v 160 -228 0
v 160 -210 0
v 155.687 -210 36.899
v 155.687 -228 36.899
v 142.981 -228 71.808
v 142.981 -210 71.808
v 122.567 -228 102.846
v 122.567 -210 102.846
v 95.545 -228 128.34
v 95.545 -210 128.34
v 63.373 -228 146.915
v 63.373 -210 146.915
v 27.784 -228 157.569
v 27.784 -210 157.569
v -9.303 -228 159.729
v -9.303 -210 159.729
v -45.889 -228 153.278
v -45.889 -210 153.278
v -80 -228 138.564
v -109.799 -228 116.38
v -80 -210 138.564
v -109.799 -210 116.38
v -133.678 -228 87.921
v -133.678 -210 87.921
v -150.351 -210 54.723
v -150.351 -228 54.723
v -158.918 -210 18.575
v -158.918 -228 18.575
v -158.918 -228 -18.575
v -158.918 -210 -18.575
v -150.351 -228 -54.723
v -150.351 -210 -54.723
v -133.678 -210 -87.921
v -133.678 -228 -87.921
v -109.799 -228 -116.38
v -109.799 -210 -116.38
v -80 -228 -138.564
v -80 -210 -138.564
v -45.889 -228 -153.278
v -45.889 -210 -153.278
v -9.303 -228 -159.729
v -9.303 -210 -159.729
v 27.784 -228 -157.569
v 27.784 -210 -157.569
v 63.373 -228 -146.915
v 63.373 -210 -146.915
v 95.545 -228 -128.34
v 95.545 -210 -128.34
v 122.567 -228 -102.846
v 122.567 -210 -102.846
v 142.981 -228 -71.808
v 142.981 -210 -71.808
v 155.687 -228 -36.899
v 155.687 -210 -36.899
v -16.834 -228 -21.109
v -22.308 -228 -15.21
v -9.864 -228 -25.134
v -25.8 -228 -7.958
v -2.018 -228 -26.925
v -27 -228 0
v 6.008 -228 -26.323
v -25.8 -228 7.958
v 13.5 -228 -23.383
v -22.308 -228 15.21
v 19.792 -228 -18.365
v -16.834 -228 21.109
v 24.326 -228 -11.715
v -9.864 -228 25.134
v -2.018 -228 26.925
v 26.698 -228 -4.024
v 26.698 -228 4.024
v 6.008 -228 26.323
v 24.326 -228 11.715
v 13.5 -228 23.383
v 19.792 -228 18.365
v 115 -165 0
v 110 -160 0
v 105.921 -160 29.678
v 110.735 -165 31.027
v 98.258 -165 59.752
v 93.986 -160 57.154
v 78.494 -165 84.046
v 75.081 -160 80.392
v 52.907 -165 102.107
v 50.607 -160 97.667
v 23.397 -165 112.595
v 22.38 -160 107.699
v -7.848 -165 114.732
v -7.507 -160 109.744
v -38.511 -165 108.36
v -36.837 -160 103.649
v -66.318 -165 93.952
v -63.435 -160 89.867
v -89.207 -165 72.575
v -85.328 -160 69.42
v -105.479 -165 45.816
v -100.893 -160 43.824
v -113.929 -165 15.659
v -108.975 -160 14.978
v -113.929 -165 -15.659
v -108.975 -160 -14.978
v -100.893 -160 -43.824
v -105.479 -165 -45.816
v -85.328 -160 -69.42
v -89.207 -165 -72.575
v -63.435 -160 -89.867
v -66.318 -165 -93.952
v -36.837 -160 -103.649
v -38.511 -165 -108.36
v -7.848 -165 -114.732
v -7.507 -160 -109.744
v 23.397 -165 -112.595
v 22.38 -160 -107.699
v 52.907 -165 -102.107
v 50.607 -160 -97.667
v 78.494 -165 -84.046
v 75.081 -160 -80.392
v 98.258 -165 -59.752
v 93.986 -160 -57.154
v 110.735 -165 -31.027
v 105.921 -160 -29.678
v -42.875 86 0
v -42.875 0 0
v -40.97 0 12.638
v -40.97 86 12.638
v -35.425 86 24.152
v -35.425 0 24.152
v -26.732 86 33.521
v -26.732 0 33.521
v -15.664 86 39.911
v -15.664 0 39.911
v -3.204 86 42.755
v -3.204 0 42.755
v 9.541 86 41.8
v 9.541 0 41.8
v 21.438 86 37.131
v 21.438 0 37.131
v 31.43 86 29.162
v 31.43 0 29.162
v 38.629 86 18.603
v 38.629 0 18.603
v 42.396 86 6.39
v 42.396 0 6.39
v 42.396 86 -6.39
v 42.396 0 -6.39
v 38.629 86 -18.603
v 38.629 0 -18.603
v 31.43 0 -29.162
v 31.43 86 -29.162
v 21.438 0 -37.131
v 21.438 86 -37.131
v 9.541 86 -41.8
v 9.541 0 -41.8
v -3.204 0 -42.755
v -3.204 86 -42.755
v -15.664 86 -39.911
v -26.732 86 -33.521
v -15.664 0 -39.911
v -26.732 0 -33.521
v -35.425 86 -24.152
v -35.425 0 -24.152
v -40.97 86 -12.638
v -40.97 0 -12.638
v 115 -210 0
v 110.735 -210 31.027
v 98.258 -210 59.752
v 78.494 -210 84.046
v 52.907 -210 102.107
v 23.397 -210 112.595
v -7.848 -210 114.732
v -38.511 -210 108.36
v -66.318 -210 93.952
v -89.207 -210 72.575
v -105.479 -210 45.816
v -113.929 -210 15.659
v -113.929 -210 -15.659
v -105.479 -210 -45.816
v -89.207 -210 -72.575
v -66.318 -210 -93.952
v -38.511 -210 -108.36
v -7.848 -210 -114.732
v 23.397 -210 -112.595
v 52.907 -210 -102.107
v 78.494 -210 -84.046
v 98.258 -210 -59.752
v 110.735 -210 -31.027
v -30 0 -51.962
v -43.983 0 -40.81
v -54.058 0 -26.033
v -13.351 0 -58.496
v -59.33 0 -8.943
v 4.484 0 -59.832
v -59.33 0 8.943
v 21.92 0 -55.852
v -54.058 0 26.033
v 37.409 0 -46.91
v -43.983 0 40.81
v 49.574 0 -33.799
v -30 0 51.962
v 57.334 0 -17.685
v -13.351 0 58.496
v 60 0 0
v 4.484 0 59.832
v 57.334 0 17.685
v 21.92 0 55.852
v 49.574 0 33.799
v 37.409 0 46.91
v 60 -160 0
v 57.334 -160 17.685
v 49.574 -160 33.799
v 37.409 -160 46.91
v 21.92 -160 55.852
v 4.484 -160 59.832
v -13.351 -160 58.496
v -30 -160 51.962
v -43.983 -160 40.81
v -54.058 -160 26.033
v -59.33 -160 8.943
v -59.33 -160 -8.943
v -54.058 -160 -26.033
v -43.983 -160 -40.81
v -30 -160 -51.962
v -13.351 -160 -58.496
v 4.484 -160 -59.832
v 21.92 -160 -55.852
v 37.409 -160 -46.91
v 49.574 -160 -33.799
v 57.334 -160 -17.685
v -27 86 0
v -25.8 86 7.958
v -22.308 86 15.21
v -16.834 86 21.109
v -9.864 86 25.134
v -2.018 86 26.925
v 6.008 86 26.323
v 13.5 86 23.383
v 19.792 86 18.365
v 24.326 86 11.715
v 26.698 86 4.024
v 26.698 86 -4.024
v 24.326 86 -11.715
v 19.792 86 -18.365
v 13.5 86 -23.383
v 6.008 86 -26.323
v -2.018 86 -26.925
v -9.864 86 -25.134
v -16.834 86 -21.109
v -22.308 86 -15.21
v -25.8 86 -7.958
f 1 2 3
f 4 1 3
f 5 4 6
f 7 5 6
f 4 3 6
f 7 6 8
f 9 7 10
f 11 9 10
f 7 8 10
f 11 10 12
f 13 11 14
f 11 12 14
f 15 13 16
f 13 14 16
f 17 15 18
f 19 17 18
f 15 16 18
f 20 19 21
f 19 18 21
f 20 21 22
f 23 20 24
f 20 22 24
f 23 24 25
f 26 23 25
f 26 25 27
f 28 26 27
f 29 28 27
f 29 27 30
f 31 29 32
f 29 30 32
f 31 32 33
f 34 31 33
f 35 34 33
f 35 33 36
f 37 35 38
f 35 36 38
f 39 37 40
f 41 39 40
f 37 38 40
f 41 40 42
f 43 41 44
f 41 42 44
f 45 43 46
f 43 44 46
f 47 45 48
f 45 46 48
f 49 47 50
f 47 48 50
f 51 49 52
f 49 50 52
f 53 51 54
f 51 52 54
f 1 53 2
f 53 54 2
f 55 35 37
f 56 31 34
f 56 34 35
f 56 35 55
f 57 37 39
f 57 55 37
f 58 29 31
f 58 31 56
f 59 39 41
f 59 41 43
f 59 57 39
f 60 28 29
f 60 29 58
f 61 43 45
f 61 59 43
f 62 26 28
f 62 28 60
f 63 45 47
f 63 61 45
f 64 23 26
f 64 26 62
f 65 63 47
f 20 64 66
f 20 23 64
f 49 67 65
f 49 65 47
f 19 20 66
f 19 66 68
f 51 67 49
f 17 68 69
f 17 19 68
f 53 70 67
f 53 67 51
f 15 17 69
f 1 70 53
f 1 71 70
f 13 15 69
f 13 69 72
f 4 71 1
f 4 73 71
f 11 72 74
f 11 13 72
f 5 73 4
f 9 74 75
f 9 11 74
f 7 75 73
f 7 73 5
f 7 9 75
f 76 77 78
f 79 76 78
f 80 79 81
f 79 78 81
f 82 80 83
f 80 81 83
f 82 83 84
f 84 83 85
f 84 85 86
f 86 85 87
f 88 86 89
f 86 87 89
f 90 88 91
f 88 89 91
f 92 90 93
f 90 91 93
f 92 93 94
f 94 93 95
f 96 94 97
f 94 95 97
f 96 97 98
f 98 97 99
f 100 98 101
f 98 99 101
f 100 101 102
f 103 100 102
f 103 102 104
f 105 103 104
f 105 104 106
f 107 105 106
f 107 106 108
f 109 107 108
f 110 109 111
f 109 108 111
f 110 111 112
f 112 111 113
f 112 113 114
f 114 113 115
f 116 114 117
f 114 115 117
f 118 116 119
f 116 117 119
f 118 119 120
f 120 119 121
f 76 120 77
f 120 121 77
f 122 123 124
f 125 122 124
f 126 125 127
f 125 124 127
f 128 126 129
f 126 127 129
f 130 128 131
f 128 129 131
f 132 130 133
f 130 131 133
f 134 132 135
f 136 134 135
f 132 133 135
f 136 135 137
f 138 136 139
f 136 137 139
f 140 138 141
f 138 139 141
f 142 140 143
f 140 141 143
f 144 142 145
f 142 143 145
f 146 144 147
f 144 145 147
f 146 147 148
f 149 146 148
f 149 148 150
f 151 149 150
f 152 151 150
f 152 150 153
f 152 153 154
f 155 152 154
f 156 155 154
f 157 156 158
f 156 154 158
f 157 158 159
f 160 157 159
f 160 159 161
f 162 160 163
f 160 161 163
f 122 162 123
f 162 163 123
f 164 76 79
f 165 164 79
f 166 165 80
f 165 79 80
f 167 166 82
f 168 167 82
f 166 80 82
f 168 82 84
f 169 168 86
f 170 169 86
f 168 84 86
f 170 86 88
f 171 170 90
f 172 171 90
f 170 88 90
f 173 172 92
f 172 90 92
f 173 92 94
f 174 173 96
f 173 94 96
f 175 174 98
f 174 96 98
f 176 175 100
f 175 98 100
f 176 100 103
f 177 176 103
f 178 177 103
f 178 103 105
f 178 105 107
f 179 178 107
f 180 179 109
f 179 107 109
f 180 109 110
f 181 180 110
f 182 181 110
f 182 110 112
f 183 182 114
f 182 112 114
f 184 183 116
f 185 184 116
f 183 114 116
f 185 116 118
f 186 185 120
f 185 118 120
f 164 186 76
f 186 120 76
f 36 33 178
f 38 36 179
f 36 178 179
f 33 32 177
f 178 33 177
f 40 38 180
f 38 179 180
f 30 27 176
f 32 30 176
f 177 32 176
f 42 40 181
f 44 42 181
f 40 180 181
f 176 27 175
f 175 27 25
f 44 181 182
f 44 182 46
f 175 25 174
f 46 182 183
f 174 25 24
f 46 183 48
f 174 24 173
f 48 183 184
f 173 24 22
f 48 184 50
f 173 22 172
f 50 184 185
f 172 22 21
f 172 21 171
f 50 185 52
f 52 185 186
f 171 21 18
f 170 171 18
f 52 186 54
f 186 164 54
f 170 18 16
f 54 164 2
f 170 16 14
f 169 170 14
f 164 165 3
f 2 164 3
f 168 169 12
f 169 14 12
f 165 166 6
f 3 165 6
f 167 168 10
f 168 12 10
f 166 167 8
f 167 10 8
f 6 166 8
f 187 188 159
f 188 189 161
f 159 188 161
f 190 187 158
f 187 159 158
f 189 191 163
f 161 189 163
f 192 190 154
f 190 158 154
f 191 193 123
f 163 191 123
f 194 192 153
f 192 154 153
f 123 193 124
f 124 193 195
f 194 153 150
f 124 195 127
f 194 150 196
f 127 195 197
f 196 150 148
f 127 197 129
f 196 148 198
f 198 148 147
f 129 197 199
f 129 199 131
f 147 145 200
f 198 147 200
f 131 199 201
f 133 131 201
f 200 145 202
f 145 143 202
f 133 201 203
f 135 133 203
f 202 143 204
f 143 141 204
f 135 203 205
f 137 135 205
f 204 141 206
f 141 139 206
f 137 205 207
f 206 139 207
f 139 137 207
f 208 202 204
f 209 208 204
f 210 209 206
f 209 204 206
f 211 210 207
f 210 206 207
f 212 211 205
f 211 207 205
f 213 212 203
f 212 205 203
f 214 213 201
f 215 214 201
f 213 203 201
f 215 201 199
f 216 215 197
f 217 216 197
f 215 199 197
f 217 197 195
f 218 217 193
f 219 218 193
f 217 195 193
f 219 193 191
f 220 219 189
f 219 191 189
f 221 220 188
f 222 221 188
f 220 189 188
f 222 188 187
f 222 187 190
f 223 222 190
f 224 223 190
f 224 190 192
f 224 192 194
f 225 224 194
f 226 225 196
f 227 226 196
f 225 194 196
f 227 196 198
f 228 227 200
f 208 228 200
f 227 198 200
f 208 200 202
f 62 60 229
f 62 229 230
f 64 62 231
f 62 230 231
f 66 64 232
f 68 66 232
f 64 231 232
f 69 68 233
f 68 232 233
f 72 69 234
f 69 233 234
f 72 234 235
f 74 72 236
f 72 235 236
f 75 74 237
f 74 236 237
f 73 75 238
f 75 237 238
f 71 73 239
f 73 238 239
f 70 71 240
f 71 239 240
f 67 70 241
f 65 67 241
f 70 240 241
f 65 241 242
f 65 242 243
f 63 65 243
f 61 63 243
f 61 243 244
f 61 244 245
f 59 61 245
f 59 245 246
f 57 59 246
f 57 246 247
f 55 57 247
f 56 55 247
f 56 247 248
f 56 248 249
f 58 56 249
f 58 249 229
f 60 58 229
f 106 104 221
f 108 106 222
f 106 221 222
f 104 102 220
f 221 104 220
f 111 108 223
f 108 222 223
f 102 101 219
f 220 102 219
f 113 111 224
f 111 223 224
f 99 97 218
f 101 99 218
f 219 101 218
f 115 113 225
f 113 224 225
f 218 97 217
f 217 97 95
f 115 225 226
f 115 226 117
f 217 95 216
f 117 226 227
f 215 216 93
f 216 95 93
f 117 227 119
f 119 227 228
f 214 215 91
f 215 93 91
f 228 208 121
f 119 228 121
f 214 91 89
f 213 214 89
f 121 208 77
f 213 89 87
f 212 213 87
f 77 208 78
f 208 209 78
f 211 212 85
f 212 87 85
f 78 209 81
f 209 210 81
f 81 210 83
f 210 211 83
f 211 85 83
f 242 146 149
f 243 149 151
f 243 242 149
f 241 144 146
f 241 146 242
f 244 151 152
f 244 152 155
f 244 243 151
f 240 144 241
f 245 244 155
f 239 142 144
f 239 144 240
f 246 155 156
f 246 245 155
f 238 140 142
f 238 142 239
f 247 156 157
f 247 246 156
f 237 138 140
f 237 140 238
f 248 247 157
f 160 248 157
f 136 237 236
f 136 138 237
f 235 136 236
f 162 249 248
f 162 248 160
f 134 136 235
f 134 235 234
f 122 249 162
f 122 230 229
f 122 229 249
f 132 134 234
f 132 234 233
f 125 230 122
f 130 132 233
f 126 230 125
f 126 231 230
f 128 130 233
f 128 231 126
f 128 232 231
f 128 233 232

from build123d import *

# Parameters (mm, degrees)
F0_R      = 60
F1_DEPTH  = 160
F2_R      = 115
F3_DEPTH  = 50
F4_R      = 160
F5_DEPTH  = 18
F6_SIZE   = 5
F7_R      = 42.875
F8_DEPTH  = 86
F9_R      = 27
F10_DEPTH = 430


with BuildPart() as f1:
    # F0 (on Front) → F1 (new body)
    with BuildSketch(Plane.XZ):
        Circle(F0_R)
    extrude(amount=F1_DEPTH)

    # F2 (on face) → F3 (join)
    with BuildSketch(Plane.XZ.offset(160)):
        Circle(F2_R)
    extrude(amount=F3_DEPTH)

    # F4 (on face) → F5 (join)
    with BuildSketch(Plane.XZ.offset(210)):
        Circle(F4_R)
    extrude(amount=F5_DEPTH)

    # F6
    f6_edges = [f1.edges().sort_by_distance(p)[0] for p in [
        (-115, -160, 0),
    ]]
    chamfer(f6_edges, length=F6_SIZE)

    # F7 (on face) → F8 (join)
    with BuildSketch(Plane(origin=(0, 0, 0), x_dir=(-1, 0, 0), z_dir=(0, 1, 0))):
        Circle(F7_R)
    extrude(amount=F8_DEPTH)

    # F9 (on face) → F10 (cut)
    with BuildSketch(Plane(origin=(0, 86, 0), x_dir=(-1, 0, 0), z_dir=(0, 1, 0))):
        Circle(F9_R)
    extrude(amount=-F10_DEPTH, mode=Mode.SUBTRACT)


solid = f1.part
